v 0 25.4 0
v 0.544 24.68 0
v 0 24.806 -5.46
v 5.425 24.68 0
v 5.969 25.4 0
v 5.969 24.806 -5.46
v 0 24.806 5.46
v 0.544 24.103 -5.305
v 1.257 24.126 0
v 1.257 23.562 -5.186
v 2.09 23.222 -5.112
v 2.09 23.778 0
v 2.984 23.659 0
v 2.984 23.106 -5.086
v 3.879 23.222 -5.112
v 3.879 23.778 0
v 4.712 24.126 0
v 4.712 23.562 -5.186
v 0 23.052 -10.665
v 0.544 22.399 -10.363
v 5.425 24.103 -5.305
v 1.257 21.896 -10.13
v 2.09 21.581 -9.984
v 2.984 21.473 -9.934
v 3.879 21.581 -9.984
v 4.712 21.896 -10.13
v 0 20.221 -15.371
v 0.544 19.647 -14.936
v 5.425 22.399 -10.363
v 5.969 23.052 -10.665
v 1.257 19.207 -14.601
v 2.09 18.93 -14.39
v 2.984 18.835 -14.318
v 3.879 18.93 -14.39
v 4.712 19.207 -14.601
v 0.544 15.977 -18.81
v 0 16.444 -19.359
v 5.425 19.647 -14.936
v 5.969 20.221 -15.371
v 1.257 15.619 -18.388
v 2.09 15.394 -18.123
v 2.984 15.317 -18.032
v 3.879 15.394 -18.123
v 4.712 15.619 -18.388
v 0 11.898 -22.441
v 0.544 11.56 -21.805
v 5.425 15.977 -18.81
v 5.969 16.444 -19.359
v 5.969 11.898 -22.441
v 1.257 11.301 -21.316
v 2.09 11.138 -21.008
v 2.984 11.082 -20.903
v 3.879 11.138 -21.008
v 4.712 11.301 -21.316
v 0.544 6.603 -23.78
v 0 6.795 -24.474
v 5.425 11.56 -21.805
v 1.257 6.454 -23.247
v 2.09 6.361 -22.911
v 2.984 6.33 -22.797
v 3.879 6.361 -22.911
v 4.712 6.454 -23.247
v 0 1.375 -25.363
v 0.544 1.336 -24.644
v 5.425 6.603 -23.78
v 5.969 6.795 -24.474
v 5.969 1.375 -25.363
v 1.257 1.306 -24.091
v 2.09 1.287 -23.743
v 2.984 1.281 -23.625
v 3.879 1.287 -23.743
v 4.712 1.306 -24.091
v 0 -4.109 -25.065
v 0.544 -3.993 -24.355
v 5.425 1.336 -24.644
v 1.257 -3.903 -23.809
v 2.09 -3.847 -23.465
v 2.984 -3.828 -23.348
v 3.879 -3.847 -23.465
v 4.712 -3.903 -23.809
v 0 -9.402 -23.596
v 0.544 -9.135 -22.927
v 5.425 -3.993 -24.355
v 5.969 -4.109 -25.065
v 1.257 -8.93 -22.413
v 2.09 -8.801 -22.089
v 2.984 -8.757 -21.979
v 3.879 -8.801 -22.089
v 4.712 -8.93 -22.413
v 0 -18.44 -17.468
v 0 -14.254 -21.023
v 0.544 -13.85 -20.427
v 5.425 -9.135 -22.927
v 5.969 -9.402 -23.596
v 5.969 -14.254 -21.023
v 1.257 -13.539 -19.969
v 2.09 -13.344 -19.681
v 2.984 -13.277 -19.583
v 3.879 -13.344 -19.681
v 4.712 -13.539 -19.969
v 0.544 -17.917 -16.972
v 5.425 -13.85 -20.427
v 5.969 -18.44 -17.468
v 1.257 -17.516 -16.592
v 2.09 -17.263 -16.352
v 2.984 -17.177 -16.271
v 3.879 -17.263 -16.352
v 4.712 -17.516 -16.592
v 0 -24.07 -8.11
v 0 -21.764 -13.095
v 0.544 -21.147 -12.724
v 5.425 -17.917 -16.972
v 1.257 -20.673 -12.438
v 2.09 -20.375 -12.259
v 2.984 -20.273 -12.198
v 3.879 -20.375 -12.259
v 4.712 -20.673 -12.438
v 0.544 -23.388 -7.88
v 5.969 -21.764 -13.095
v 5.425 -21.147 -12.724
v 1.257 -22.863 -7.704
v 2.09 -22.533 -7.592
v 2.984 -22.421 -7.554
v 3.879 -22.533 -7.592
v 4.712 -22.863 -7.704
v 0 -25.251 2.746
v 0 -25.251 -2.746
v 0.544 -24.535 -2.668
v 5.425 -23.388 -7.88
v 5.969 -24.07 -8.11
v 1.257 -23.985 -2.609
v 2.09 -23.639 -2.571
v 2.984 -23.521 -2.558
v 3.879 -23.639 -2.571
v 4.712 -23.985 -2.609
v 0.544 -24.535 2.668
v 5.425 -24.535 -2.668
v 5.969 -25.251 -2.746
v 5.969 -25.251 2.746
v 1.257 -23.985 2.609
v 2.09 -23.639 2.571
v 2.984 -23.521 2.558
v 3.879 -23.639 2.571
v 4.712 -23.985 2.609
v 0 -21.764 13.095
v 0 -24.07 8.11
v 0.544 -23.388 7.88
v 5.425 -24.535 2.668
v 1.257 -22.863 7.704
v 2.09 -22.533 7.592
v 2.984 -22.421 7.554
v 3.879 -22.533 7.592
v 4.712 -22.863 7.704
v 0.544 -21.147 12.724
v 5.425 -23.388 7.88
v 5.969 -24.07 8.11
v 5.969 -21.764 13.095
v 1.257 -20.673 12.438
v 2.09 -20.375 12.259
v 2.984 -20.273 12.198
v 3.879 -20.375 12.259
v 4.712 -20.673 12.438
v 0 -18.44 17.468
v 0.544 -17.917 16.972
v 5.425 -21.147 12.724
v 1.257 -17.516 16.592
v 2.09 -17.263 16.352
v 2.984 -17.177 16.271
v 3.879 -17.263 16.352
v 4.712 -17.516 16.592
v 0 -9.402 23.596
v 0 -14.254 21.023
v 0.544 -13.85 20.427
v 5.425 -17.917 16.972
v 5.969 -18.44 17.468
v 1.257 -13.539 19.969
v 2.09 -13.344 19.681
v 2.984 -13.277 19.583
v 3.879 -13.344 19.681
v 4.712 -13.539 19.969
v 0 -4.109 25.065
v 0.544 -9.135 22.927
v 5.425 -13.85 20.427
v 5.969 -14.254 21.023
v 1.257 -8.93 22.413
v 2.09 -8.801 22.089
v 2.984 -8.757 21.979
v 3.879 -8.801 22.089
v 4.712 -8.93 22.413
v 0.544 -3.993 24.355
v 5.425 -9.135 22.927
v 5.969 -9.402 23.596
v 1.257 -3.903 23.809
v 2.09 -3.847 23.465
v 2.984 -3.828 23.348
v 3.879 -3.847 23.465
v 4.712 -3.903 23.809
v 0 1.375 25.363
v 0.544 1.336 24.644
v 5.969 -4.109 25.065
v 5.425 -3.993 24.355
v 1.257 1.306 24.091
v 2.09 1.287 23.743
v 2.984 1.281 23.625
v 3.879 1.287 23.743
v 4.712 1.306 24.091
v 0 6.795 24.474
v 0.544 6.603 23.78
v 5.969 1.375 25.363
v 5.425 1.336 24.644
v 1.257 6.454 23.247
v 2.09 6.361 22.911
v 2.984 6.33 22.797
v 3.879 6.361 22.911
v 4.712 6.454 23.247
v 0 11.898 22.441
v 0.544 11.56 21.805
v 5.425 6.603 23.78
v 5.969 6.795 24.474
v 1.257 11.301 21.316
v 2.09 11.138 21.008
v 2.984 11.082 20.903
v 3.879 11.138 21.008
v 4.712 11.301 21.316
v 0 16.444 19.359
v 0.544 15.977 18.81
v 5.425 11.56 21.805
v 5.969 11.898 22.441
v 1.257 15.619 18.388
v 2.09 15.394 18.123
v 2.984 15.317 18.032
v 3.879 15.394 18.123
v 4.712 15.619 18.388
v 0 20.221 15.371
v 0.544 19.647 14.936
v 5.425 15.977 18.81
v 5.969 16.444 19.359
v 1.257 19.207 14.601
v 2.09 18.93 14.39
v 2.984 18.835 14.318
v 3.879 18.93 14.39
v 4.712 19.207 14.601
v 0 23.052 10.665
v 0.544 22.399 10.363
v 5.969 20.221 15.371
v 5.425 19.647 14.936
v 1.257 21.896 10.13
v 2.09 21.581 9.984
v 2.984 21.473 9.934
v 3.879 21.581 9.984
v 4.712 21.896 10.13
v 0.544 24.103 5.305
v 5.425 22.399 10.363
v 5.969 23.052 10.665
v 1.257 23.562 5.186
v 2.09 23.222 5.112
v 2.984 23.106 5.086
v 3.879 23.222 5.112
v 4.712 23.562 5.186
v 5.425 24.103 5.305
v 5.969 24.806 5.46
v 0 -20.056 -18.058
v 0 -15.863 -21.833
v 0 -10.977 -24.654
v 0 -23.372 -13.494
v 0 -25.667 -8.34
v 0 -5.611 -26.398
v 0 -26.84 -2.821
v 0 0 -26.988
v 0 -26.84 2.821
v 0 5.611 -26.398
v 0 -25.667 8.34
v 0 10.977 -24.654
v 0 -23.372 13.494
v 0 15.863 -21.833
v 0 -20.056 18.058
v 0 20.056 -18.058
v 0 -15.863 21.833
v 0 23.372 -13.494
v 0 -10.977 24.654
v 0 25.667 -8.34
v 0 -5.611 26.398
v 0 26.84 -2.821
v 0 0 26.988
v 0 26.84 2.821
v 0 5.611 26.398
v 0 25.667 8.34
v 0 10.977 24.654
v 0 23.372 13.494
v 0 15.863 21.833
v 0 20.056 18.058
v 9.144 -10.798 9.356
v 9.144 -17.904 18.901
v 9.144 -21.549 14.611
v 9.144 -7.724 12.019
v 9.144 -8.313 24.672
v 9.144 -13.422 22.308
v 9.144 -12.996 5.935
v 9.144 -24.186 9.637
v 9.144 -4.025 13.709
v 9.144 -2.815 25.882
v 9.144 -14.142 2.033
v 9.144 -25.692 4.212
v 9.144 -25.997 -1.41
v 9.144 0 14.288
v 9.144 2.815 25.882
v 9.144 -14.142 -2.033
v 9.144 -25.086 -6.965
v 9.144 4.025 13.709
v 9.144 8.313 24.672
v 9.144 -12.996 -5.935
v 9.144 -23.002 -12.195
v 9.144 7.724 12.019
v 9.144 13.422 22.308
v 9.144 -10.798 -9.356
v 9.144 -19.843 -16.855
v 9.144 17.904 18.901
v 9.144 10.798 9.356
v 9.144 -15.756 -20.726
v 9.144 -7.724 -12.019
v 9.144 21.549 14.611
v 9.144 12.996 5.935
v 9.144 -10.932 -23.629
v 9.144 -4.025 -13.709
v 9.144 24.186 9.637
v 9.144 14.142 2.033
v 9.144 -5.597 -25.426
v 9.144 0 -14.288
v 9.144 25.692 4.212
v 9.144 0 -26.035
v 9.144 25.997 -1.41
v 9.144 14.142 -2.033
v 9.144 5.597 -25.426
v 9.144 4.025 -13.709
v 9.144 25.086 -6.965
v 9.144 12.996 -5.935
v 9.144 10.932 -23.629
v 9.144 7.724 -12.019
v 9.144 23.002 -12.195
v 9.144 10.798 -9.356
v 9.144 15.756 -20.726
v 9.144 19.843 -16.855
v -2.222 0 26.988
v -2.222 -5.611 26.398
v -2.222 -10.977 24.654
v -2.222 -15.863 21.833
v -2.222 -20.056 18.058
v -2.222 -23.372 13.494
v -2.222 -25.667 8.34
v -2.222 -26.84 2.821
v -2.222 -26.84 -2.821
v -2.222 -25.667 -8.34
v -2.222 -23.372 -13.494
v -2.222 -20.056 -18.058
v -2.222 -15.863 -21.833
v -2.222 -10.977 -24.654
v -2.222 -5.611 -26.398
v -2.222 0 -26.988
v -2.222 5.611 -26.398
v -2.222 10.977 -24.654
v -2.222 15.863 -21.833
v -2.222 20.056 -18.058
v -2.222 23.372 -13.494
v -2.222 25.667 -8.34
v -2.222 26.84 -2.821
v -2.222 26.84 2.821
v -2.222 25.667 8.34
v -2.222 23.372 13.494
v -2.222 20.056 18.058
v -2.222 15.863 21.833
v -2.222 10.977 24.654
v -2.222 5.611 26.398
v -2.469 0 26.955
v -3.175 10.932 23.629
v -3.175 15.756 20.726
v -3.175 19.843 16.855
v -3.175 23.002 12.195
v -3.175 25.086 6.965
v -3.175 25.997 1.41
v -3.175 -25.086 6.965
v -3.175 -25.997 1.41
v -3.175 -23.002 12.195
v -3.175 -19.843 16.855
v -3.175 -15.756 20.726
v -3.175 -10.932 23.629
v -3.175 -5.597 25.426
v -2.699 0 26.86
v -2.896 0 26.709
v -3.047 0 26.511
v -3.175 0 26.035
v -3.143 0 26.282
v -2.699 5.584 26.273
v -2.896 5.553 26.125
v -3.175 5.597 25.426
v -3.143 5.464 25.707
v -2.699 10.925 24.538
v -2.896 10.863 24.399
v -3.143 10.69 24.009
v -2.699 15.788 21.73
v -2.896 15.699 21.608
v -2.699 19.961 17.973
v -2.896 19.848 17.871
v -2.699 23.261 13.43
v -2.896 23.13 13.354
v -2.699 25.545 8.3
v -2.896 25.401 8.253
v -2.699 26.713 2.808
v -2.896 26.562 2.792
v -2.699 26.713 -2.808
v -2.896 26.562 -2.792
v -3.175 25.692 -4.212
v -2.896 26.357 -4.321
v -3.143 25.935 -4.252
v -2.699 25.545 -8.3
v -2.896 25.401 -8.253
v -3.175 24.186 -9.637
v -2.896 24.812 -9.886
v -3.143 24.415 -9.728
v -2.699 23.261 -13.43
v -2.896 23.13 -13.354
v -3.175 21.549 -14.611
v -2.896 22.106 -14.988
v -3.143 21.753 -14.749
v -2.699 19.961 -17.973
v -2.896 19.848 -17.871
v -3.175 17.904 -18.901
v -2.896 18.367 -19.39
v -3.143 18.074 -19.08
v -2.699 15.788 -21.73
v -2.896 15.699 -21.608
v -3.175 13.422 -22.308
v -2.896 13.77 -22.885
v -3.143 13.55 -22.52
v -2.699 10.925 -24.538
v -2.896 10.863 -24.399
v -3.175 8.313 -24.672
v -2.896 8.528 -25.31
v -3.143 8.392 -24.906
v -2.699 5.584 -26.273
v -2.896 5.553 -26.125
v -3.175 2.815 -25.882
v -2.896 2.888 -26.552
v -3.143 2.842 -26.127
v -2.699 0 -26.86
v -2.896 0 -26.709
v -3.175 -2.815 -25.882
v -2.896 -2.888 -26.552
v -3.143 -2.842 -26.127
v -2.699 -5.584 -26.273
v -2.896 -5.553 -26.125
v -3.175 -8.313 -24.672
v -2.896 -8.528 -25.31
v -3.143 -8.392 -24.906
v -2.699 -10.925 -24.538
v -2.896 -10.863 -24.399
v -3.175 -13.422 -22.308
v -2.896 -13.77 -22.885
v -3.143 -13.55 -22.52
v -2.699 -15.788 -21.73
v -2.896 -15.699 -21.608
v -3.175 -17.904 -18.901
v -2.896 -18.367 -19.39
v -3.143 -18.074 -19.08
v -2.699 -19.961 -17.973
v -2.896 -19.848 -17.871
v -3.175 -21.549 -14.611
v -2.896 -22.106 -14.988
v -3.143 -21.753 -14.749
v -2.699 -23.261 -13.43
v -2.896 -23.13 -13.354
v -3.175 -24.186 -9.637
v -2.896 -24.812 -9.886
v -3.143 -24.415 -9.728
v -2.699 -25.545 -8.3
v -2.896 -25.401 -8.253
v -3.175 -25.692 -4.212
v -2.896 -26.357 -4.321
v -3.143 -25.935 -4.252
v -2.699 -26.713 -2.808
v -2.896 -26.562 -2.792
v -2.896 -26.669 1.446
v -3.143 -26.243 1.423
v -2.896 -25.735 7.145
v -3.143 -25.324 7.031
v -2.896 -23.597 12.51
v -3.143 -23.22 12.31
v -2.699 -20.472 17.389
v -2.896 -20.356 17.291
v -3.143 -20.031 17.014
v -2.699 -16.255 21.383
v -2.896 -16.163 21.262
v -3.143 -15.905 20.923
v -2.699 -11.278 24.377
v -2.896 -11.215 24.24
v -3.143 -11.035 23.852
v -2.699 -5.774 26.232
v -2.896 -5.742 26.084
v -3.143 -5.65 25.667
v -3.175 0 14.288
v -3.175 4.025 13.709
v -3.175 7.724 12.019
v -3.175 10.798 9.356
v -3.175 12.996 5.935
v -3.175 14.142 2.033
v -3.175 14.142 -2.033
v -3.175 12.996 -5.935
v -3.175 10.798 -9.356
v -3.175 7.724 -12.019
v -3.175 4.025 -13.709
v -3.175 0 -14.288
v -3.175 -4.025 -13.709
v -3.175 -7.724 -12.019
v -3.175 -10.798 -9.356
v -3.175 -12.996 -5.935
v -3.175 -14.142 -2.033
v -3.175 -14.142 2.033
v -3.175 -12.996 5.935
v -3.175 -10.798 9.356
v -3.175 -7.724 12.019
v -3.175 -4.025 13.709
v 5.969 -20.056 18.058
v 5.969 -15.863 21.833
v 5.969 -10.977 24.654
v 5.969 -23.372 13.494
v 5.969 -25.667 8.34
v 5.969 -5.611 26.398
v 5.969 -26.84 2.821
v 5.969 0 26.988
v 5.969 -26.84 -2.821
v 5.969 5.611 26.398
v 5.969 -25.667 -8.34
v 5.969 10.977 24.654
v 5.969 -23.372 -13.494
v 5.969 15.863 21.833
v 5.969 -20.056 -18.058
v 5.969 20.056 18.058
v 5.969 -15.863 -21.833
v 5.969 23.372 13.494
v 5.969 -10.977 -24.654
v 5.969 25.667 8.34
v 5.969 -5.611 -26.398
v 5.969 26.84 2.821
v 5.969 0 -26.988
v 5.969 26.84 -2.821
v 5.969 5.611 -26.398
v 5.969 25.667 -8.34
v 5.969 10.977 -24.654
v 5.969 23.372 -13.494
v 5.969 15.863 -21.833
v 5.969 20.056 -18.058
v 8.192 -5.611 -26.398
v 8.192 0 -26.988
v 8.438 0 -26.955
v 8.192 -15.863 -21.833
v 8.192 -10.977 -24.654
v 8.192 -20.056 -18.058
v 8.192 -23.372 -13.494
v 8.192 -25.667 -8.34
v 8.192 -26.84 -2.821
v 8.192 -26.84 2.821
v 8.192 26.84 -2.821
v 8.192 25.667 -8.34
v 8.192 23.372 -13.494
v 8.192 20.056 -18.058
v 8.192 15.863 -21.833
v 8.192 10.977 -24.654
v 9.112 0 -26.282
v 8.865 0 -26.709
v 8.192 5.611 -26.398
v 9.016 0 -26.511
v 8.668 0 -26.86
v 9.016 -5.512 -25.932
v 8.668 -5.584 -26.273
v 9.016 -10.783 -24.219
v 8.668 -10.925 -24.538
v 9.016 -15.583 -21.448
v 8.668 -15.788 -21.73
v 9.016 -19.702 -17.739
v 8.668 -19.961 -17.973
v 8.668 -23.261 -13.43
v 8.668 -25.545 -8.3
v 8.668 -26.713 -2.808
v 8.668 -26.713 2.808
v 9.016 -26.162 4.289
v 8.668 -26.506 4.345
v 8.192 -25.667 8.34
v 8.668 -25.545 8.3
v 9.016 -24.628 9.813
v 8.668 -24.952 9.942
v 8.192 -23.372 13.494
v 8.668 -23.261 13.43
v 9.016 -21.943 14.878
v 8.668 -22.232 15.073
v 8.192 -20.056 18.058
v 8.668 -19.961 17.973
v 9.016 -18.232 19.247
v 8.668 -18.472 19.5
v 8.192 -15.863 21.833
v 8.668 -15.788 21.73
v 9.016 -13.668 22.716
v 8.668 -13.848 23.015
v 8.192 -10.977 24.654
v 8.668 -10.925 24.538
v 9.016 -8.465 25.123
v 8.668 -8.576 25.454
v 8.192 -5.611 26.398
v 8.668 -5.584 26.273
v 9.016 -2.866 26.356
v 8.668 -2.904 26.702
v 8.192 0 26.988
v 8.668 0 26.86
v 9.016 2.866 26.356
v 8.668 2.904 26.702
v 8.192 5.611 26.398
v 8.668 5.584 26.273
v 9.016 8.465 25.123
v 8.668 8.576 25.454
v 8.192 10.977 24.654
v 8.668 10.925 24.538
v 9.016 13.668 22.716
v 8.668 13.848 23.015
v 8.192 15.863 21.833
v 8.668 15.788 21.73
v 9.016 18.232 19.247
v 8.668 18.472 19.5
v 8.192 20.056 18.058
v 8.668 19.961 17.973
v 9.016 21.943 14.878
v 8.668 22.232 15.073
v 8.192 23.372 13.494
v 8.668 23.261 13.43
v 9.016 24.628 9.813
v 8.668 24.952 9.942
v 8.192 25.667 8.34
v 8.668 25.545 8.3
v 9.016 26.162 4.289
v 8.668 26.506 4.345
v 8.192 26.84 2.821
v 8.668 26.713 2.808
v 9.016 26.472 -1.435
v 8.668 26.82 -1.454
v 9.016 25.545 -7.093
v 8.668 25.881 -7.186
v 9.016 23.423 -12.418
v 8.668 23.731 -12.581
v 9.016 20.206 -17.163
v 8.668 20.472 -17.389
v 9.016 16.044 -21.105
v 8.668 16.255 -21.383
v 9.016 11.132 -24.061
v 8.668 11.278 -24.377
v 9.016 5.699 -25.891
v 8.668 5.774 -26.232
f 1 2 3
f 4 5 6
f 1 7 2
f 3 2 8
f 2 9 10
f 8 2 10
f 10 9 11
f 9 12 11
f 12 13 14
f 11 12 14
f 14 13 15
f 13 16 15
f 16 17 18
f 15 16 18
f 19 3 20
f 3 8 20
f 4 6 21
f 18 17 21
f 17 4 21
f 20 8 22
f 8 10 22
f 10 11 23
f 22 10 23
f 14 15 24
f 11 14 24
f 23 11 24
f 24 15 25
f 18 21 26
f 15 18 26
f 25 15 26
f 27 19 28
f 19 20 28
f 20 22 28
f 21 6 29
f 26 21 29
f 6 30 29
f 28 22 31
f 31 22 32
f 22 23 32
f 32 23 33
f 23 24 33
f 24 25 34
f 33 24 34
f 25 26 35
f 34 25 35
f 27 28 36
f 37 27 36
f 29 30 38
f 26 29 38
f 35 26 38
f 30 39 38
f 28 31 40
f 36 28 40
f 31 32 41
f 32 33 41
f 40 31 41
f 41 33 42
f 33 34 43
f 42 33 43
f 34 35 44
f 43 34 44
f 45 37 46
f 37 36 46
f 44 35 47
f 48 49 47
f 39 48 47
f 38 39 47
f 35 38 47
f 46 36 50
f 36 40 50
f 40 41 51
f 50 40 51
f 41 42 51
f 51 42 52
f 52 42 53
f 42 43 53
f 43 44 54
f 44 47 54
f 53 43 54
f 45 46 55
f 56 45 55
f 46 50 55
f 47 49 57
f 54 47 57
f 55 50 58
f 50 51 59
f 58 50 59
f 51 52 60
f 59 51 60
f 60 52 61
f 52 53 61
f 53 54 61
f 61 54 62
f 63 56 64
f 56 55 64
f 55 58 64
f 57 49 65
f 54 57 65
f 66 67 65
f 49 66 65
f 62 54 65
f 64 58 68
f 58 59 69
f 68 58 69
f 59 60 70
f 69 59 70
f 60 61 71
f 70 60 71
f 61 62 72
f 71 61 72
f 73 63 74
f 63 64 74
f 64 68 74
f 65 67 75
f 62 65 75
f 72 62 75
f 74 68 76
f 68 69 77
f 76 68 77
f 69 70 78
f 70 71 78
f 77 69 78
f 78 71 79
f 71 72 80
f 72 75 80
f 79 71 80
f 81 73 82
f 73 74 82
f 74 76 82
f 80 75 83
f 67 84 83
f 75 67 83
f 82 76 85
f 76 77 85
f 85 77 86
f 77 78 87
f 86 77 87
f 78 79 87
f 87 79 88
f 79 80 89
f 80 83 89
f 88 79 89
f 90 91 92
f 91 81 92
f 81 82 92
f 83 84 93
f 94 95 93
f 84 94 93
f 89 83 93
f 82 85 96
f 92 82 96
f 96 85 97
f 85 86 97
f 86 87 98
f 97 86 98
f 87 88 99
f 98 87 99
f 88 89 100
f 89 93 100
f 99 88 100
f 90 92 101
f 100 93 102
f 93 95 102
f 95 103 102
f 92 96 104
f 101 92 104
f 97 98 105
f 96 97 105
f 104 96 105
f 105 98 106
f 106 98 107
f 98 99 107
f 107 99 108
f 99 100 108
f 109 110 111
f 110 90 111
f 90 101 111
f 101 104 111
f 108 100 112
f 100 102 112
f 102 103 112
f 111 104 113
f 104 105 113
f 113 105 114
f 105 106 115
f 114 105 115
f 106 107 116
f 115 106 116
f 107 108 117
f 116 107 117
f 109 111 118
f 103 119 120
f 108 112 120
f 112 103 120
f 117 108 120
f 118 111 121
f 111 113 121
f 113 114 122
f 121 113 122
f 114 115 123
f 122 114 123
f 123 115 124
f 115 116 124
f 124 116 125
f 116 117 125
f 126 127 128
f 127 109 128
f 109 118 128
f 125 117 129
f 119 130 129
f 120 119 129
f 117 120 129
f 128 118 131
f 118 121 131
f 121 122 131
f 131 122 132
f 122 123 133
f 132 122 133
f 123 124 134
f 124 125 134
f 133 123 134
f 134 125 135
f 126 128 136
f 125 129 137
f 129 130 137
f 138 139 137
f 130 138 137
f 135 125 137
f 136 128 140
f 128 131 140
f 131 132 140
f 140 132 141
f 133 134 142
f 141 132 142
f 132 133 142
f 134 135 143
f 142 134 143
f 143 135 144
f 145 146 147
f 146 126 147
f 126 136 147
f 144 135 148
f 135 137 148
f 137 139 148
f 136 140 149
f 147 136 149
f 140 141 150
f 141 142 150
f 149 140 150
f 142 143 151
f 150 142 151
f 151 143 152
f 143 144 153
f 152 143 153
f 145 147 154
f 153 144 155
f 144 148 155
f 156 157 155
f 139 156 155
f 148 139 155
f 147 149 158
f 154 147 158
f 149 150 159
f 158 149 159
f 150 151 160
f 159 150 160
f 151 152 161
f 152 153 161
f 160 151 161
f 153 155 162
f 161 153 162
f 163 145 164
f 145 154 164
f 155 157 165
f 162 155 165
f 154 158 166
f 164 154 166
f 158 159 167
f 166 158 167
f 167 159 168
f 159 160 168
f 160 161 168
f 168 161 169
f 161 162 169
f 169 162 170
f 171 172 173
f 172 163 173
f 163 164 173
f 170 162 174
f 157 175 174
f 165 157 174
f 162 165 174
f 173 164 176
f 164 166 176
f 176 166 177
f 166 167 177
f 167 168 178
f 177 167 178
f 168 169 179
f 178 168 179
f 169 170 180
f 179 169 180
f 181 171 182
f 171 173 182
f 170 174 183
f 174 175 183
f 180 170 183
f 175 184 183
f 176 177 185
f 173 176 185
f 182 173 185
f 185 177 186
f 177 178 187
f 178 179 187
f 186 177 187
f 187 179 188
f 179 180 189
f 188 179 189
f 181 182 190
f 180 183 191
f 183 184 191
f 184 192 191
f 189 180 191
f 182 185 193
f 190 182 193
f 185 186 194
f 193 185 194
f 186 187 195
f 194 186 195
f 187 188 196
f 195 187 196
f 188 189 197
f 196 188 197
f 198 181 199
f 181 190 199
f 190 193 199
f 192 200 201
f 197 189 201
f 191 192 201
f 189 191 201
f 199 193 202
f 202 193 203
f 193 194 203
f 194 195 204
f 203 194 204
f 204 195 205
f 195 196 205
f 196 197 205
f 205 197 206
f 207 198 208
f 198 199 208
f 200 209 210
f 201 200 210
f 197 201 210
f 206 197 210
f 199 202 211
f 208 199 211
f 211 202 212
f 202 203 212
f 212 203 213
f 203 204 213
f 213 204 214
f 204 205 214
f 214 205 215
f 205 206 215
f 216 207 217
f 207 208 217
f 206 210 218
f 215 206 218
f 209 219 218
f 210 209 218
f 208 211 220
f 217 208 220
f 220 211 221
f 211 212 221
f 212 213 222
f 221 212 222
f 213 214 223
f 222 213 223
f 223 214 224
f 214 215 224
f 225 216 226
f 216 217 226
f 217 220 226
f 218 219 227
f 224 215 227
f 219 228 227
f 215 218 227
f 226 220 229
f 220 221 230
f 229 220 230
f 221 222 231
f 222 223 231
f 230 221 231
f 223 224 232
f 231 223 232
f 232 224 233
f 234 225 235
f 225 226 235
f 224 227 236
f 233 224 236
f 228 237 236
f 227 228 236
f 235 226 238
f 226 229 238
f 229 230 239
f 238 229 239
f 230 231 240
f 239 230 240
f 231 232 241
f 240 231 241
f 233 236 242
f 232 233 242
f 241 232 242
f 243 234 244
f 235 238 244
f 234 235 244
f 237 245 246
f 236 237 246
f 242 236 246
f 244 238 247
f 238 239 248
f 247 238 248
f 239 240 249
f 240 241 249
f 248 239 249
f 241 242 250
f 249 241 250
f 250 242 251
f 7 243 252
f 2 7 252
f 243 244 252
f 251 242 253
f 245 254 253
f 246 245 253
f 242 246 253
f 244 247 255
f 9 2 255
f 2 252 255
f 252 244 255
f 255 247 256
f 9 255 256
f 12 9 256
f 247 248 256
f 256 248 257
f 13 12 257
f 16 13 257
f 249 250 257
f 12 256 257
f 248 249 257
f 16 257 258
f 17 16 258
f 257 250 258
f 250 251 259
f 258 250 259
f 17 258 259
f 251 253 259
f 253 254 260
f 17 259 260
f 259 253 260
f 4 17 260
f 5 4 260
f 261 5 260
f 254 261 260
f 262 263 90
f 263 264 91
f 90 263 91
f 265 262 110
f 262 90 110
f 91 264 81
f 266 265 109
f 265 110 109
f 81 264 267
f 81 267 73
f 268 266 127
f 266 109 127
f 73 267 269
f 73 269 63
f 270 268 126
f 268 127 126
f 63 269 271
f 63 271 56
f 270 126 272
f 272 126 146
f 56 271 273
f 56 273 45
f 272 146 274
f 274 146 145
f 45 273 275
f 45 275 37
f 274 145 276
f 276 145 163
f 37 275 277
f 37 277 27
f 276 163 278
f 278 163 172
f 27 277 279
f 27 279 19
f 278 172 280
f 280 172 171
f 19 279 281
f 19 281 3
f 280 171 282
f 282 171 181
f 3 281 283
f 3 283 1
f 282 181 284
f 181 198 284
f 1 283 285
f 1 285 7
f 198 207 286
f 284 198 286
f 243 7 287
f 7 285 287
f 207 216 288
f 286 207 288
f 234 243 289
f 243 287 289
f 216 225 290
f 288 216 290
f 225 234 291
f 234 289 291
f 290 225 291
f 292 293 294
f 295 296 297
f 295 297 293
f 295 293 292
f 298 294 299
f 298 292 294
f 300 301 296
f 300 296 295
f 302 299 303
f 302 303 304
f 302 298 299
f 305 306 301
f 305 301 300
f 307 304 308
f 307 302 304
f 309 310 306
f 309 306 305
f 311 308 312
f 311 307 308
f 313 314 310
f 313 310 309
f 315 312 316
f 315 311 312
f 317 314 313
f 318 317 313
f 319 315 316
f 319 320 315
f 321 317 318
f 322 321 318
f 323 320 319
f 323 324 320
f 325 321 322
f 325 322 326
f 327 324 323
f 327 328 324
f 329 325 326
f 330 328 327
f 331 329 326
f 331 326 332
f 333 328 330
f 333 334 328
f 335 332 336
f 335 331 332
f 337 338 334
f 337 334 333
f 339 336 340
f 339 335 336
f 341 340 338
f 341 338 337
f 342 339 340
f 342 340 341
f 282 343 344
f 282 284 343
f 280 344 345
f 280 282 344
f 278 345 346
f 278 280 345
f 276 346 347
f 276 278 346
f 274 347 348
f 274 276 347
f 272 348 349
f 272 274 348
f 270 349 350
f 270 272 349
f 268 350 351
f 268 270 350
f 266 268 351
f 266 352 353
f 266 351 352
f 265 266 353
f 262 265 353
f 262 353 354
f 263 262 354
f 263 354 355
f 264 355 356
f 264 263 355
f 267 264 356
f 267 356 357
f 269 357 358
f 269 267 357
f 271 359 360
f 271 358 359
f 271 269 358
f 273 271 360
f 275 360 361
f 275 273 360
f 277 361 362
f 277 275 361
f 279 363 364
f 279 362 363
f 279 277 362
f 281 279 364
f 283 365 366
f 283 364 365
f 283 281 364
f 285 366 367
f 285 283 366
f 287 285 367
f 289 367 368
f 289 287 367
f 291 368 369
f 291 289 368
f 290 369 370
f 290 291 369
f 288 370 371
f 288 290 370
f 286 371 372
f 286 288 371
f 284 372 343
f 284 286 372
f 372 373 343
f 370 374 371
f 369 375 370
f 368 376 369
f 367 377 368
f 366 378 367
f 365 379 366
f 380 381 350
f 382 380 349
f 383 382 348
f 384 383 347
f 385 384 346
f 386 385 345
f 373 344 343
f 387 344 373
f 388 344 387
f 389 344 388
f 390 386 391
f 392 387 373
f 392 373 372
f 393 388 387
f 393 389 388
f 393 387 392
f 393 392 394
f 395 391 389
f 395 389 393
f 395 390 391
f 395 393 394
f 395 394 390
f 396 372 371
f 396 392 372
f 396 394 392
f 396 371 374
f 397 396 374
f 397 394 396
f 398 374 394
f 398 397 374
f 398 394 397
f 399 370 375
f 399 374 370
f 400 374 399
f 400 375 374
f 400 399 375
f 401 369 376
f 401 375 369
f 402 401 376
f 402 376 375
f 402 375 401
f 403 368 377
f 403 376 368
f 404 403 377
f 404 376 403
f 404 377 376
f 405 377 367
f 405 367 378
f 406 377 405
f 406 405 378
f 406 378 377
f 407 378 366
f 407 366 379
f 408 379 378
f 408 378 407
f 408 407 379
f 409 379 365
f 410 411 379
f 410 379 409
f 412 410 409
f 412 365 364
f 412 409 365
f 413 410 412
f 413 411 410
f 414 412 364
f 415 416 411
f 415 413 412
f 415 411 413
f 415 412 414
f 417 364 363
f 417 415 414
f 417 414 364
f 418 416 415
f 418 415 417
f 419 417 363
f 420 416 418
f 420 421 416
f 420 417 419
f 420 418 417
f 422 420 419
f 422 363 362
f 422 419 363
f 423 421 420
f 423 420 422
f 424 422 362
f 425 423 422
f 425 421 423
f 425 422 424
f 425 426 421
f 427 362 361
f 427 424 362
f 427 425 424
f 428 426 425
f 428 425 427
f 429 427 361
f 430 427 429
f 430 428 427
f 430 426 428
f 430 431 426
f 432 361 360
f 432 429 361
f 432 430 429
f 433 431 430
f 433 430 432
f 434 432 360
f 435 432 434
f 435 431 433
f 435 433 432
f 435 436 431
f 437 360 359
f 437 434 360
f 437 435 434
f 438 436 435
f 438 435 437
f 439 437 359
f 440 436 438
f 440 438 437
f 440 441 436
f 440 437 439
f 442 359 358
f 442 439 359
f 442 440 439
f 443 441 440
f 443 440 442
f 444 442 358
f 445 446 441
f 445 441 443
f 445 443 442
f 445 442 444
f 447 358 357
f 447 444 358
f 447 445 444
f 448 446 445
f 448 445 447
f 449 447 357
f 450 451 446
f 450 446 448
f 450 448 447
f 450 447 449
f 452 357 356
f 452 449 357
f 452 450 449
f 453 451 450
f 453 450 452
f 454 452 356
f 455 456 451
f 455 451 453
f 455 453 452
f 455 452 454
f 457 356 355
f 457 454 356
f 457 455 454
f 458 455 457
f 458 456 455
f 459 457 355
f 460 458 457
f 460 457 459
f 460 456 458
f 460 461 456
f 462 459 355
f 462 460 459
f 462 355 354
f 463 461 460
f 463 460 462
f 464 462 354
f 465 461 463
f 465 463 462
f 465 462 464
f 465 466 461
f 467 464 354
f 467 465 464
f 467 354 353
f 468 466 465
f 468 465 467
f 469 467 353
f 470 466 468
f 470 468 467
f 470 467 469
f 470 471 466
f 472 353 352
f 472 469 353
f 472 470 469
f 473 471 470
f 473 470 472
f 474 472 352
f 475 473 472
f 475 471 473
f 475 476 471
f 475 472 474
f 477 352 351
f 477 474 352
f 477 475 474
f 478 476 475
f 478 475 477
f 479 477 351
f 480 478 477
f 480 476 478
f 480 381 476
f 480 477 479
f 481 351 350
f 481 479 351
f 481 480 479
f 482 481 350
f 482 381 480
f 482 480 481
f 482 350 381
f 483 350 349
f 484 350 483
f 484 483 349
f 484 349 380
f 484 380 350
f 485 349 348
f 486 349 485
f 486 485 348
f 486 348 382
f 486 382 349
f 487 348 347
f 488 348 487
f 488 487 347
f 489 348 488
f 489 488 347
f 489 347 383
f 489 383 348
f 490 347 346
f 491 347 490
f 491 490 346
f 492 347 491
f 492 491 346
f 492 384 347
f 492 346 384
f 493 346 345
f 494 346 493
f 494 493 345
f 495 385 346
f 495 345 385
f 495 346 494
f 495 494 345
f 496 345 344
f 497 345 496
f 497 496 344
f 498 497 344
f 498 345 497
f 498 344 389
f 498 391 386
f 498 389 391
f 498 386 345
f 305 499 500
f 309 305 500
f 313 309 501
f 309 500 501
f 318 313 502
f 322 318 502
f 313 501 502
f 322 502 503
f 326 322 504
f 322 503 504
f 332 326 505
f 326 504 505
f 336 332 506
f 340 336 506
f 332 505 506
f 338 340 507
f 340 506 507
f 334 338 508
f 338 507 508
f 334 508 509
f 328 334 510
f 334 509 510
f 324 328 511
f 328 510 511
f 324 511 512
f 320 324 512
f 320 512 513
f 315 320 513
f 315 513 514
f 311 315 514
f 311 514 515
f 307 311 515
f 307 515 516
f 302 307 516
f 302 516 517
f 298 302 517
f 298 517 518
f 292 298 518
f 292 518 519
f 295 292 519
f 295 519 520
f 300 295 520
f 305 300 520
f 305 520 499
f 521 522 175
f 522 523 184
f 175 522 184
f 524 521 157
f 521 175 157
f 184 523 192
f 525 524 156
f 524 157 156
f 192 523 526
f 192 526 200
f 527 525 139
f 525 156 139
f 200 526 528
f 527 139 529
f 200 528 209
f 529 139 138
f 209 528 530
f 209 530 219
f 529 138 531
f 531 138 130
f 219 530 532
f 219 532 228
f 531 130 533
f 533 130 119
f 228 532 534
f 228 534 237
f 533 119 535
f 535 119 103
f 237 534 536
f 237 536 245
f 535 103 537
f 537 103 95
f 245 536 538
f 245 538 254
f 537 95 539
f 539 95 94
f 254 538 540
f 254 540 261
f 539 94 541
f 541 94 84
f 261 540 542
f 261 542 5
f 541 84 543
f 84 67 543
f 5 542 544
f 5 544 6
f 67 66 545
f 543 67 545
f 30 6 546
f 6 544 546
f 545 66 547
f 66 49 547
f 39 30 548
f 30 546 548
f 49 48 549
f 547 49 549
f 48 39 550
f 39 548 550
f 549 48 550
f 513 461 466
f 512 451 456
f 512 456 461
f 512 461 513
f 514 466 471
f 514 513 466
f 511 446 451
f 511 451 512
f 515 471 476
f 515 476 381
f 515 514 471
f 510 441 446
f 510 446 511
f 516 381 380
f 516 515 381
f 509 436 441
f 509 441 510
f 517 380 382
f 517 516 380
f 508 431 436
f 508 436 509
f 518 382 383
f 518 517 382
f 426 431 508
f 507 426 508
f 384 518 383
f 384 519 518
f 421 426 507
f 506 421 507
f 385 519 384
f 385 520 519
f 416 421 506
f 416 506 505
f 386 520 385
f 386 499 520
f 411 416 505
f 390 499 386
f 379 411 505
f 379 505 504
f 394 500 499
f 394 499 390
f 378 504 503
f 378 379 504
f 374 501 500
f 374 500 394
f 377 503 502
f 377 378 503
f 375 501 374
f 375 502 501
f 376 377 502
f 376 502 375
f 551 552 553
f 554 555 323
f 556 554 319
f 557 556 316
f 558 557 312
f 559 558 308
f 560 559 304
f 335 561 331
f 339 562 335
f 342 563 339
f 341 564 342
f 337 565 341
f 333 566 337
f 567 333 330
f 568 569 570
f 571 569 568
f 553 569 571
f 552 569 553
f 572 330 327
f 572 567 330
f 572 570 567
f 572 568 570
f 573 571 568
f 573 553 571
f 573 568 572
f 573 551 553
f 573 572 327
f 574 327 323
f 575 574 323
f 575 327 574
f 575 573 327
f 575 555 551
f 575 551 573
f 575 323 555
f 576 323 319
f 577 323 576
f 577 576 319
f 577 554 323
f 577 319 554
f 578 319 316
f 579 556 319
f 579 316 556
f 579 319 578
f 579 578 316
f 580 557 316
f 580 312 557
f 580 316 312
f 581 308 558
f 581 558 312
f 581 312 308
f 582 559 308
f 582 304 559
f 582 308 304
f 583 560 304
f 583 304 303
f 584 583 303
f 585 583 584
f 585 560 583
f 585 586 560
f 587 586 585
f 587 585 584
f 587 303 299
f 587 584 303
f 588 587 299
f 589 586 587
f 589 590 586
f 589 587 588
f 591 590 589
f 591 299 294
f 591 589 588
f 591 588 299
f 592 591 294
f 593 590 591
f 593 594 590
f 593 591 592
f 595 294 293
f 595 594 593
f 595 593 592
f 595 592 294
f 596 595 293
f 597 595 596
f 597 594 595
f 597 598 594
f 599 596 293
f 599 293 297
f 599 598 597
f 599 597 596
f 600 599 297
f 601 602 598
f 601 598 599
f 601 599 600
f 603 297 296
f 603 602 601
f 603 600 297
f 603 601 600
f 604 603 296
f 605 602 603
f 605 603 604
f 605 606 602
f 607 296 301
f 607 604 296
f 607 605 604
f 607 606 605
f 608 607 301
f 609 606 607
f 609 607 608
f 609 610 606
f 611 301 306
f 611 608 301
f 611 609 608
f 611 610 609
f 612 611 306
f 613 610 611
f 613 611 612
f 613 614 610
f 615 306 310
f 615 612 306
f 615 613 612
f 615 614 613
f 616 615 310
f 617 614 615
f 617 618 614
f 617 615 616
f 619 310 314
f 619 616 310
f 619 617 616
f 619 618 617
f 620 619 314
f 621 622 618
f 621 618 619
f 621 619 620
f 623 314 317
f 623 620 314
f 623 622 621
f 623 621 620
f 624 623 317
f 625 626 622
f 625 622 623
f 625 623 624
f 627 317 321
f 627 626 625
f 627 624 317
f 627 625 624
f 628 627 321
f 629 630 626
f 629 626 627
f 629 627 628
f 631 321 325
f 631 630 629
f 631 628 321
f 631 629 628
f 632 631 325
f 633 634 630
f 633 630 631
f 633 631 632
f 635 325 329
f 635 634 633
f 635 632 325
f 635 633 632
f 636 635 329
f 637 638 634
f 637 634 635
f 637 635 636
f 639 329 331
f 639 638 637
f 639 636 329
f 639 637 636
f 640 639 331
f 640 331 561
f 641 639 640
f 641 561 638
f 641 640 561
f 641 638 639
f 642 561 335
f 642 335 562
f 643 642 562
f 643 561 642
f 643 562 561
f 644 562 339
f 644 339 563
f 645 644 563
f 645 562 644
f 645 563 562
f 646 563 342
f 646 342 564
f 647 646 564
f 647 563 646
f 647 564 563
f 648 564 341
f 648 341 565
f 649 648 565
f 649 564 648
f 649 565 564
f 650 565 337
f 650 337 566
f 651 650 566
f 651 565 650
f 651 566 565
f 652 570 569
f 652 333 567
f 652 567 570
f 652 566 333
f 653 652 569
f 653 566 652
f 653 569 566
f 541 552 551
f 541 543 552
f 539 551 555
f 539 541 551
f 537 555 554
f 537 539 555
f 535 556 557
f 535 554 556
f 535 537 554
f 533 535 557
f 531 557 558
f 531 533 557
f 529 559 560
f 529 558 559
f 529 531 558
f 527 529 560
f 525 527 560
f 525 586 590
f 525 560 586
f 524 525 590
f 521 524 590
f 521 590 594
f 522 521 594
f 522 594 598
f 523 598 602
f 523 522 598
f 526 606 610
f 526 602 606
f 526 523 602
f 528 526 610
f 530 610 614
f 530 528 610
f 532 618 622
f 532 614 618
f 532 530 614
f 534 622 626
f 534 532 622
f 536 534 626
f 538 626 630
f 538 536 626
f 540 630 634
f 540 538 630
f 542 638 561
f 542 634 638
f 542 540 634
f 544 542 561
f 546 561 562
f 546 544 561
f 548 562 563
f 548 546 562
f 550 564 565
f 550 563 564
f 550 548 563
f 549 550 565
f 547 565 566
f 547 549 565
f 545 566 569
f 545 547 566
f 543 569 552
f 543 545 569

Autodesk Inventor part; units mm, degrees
ref_plane "YZ Plane" through (0, 0, 0) normal (1, 0, 0) x (0, 1, 0)
ref_plane "XZ Plane" through (0, 0, 0) normal (0, 1, 0) x (-1, 0, 0)
ref_plane "XY Plane" through (0, 0, 0) normal (0, 0, 1) x (1, 0, 0)
sketch "Sketch1" plane through (0, 0, 0) normal (0, 0, 1) x (1, 0, 0)
  line L0 (0, 0) -> (0, 25.4)
  line L1 (0, 0) -> (5.969, 0)
  line L2 (5.969, 0) -> (5.969, 25.4)
  arc A0 (0, 25.4) -> (5.969, 25.4) centre (2.9845, 27.0884) ccw
  dimension "d0" = 3.429
  dimension "d1" = 25.4
  dimension "d2" = 5.969
revolve "Revolution1" add sketch "Sketch1" angle 360 about axis through (0, 0, 0) along (1, 0, 0)
sketch "Sketch2" plane through (5.969, 0, 0) normal (1, 0, 0) x (0, 0, -1)
  circle A0 centre (0, 0) radius 26.9875
  dimension "d4" = 53.975
extrude "Extrusion1" add sketch "Sketch2" along normal blind 3.175
sketch "Sketch3" plane through (0, 0, 0) normal (-1, 0, 0) x (0, 0, 1)
  circle A0 centre (0, 0) radius 26.9875
  dimension "d7" = 53.975
extrude "Extrusion2" add sketch "Sketch3" along normal blind 3.175
sketch "Sketch4" plane through (-3.175, 0, 0) normal (-1, 0, 0) x (0, 0, 1)
  circle A0 centre (0, 0) radius 14.2875
  dimension "d10" = 28.575
extrude "Extrusion3" cut sketch "Sketch4" against normal through all
fillet "Fillet1" radius 0.9525 2 edges at (-3.175, 0, -26.9875) (9.144, 0, 26.9875)
properties part number "1 1_8 Bore Pollycord Pully" material "ABS Plastic"
